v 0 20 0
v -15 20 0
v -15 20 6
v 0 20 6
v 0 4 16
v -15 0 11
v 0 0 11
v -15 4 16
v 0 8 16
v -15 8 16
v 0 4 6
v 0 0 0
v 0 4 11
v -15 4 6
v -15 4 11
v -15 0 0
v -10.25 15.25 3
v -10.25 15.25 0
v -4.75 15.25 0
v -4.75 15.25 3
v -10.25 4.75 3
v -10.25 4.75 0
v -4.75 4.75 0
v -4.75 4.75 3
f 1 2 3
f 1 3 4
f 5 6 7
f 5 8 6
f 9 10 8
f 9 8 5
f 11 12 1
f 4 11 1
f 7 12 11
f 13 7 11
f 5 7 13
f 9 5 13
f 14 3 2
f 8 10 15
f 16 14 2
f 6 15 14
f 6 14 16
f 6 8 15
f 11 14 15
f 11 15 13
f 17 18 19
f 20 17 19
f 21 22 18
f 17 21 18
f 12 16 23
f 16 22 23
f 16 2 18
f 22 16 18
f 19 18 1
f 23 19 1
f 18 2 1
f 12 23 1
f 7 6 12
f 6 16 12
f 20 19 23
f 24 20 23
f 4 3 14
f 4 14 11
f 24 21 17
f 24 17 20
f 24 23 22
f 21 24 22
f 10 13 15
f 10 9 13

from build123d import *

# Parameters (mm, degrees)
F0_W      = 15
F0_H      = 20
F1_DEPTH  = 6
F3_DEPTH  = 3
F4_W      = 15
F4_H      = 4
F5_DEPTH  = 5
F5_FACE_W = 15
F5_FACE_H = 4
F7_W      = 15
F7_H      = 4


with BuildPart() as f1:
    # F0 (on Top) → F1 (new body)
    with BuildSketch(Plane.XY):
        with Locations((-7.5, 10)):
            Rectangle(F0_W, F0_H)
    extrude(amount=F1_DEPTH)

    # F2 (on face) → F3 (cut)
    with BuildSketch(Plane(origin=(0, 0, 0), x_dir=(1, 0, 0), z_dir=(0, 0, -1))):
        Polygon((-7.5, -15.25), (-4.75, -15.25), (-4.75, -4.75), (-7.5, -4.75), (-10.25, -4.75), (-10.25, -15.25), align=None)
    extrude(amount=-F3_DEPTH, mode=Mode.SUBTRACT)

    # F4 (on face) → F5 (join)
    with BuildSketch(Plane.XY.offset(6)):
        with Locations((-7.5, 2)):
            Rectangle(F4_W, F4_H)
    extrude(amount=F5_DEPTH)

    # F5_face (on face) → F8 section 0
    with BuildSketch(Plane(origin=(-7.5, 2, 11), x_dir=(1, 0, 0), z_dir=(0, 0, 1))):
        Rectangle(F5_FACE_W, F5_FACE_H)
    # F7 (on offset) → F8 section 1
    with BuildSketch(Plane.XY.offset(16)):
        with Locations((-7.5, 6)):
            Rectangle(F7_W, F7_H)
    loft()


solid = f1.part
